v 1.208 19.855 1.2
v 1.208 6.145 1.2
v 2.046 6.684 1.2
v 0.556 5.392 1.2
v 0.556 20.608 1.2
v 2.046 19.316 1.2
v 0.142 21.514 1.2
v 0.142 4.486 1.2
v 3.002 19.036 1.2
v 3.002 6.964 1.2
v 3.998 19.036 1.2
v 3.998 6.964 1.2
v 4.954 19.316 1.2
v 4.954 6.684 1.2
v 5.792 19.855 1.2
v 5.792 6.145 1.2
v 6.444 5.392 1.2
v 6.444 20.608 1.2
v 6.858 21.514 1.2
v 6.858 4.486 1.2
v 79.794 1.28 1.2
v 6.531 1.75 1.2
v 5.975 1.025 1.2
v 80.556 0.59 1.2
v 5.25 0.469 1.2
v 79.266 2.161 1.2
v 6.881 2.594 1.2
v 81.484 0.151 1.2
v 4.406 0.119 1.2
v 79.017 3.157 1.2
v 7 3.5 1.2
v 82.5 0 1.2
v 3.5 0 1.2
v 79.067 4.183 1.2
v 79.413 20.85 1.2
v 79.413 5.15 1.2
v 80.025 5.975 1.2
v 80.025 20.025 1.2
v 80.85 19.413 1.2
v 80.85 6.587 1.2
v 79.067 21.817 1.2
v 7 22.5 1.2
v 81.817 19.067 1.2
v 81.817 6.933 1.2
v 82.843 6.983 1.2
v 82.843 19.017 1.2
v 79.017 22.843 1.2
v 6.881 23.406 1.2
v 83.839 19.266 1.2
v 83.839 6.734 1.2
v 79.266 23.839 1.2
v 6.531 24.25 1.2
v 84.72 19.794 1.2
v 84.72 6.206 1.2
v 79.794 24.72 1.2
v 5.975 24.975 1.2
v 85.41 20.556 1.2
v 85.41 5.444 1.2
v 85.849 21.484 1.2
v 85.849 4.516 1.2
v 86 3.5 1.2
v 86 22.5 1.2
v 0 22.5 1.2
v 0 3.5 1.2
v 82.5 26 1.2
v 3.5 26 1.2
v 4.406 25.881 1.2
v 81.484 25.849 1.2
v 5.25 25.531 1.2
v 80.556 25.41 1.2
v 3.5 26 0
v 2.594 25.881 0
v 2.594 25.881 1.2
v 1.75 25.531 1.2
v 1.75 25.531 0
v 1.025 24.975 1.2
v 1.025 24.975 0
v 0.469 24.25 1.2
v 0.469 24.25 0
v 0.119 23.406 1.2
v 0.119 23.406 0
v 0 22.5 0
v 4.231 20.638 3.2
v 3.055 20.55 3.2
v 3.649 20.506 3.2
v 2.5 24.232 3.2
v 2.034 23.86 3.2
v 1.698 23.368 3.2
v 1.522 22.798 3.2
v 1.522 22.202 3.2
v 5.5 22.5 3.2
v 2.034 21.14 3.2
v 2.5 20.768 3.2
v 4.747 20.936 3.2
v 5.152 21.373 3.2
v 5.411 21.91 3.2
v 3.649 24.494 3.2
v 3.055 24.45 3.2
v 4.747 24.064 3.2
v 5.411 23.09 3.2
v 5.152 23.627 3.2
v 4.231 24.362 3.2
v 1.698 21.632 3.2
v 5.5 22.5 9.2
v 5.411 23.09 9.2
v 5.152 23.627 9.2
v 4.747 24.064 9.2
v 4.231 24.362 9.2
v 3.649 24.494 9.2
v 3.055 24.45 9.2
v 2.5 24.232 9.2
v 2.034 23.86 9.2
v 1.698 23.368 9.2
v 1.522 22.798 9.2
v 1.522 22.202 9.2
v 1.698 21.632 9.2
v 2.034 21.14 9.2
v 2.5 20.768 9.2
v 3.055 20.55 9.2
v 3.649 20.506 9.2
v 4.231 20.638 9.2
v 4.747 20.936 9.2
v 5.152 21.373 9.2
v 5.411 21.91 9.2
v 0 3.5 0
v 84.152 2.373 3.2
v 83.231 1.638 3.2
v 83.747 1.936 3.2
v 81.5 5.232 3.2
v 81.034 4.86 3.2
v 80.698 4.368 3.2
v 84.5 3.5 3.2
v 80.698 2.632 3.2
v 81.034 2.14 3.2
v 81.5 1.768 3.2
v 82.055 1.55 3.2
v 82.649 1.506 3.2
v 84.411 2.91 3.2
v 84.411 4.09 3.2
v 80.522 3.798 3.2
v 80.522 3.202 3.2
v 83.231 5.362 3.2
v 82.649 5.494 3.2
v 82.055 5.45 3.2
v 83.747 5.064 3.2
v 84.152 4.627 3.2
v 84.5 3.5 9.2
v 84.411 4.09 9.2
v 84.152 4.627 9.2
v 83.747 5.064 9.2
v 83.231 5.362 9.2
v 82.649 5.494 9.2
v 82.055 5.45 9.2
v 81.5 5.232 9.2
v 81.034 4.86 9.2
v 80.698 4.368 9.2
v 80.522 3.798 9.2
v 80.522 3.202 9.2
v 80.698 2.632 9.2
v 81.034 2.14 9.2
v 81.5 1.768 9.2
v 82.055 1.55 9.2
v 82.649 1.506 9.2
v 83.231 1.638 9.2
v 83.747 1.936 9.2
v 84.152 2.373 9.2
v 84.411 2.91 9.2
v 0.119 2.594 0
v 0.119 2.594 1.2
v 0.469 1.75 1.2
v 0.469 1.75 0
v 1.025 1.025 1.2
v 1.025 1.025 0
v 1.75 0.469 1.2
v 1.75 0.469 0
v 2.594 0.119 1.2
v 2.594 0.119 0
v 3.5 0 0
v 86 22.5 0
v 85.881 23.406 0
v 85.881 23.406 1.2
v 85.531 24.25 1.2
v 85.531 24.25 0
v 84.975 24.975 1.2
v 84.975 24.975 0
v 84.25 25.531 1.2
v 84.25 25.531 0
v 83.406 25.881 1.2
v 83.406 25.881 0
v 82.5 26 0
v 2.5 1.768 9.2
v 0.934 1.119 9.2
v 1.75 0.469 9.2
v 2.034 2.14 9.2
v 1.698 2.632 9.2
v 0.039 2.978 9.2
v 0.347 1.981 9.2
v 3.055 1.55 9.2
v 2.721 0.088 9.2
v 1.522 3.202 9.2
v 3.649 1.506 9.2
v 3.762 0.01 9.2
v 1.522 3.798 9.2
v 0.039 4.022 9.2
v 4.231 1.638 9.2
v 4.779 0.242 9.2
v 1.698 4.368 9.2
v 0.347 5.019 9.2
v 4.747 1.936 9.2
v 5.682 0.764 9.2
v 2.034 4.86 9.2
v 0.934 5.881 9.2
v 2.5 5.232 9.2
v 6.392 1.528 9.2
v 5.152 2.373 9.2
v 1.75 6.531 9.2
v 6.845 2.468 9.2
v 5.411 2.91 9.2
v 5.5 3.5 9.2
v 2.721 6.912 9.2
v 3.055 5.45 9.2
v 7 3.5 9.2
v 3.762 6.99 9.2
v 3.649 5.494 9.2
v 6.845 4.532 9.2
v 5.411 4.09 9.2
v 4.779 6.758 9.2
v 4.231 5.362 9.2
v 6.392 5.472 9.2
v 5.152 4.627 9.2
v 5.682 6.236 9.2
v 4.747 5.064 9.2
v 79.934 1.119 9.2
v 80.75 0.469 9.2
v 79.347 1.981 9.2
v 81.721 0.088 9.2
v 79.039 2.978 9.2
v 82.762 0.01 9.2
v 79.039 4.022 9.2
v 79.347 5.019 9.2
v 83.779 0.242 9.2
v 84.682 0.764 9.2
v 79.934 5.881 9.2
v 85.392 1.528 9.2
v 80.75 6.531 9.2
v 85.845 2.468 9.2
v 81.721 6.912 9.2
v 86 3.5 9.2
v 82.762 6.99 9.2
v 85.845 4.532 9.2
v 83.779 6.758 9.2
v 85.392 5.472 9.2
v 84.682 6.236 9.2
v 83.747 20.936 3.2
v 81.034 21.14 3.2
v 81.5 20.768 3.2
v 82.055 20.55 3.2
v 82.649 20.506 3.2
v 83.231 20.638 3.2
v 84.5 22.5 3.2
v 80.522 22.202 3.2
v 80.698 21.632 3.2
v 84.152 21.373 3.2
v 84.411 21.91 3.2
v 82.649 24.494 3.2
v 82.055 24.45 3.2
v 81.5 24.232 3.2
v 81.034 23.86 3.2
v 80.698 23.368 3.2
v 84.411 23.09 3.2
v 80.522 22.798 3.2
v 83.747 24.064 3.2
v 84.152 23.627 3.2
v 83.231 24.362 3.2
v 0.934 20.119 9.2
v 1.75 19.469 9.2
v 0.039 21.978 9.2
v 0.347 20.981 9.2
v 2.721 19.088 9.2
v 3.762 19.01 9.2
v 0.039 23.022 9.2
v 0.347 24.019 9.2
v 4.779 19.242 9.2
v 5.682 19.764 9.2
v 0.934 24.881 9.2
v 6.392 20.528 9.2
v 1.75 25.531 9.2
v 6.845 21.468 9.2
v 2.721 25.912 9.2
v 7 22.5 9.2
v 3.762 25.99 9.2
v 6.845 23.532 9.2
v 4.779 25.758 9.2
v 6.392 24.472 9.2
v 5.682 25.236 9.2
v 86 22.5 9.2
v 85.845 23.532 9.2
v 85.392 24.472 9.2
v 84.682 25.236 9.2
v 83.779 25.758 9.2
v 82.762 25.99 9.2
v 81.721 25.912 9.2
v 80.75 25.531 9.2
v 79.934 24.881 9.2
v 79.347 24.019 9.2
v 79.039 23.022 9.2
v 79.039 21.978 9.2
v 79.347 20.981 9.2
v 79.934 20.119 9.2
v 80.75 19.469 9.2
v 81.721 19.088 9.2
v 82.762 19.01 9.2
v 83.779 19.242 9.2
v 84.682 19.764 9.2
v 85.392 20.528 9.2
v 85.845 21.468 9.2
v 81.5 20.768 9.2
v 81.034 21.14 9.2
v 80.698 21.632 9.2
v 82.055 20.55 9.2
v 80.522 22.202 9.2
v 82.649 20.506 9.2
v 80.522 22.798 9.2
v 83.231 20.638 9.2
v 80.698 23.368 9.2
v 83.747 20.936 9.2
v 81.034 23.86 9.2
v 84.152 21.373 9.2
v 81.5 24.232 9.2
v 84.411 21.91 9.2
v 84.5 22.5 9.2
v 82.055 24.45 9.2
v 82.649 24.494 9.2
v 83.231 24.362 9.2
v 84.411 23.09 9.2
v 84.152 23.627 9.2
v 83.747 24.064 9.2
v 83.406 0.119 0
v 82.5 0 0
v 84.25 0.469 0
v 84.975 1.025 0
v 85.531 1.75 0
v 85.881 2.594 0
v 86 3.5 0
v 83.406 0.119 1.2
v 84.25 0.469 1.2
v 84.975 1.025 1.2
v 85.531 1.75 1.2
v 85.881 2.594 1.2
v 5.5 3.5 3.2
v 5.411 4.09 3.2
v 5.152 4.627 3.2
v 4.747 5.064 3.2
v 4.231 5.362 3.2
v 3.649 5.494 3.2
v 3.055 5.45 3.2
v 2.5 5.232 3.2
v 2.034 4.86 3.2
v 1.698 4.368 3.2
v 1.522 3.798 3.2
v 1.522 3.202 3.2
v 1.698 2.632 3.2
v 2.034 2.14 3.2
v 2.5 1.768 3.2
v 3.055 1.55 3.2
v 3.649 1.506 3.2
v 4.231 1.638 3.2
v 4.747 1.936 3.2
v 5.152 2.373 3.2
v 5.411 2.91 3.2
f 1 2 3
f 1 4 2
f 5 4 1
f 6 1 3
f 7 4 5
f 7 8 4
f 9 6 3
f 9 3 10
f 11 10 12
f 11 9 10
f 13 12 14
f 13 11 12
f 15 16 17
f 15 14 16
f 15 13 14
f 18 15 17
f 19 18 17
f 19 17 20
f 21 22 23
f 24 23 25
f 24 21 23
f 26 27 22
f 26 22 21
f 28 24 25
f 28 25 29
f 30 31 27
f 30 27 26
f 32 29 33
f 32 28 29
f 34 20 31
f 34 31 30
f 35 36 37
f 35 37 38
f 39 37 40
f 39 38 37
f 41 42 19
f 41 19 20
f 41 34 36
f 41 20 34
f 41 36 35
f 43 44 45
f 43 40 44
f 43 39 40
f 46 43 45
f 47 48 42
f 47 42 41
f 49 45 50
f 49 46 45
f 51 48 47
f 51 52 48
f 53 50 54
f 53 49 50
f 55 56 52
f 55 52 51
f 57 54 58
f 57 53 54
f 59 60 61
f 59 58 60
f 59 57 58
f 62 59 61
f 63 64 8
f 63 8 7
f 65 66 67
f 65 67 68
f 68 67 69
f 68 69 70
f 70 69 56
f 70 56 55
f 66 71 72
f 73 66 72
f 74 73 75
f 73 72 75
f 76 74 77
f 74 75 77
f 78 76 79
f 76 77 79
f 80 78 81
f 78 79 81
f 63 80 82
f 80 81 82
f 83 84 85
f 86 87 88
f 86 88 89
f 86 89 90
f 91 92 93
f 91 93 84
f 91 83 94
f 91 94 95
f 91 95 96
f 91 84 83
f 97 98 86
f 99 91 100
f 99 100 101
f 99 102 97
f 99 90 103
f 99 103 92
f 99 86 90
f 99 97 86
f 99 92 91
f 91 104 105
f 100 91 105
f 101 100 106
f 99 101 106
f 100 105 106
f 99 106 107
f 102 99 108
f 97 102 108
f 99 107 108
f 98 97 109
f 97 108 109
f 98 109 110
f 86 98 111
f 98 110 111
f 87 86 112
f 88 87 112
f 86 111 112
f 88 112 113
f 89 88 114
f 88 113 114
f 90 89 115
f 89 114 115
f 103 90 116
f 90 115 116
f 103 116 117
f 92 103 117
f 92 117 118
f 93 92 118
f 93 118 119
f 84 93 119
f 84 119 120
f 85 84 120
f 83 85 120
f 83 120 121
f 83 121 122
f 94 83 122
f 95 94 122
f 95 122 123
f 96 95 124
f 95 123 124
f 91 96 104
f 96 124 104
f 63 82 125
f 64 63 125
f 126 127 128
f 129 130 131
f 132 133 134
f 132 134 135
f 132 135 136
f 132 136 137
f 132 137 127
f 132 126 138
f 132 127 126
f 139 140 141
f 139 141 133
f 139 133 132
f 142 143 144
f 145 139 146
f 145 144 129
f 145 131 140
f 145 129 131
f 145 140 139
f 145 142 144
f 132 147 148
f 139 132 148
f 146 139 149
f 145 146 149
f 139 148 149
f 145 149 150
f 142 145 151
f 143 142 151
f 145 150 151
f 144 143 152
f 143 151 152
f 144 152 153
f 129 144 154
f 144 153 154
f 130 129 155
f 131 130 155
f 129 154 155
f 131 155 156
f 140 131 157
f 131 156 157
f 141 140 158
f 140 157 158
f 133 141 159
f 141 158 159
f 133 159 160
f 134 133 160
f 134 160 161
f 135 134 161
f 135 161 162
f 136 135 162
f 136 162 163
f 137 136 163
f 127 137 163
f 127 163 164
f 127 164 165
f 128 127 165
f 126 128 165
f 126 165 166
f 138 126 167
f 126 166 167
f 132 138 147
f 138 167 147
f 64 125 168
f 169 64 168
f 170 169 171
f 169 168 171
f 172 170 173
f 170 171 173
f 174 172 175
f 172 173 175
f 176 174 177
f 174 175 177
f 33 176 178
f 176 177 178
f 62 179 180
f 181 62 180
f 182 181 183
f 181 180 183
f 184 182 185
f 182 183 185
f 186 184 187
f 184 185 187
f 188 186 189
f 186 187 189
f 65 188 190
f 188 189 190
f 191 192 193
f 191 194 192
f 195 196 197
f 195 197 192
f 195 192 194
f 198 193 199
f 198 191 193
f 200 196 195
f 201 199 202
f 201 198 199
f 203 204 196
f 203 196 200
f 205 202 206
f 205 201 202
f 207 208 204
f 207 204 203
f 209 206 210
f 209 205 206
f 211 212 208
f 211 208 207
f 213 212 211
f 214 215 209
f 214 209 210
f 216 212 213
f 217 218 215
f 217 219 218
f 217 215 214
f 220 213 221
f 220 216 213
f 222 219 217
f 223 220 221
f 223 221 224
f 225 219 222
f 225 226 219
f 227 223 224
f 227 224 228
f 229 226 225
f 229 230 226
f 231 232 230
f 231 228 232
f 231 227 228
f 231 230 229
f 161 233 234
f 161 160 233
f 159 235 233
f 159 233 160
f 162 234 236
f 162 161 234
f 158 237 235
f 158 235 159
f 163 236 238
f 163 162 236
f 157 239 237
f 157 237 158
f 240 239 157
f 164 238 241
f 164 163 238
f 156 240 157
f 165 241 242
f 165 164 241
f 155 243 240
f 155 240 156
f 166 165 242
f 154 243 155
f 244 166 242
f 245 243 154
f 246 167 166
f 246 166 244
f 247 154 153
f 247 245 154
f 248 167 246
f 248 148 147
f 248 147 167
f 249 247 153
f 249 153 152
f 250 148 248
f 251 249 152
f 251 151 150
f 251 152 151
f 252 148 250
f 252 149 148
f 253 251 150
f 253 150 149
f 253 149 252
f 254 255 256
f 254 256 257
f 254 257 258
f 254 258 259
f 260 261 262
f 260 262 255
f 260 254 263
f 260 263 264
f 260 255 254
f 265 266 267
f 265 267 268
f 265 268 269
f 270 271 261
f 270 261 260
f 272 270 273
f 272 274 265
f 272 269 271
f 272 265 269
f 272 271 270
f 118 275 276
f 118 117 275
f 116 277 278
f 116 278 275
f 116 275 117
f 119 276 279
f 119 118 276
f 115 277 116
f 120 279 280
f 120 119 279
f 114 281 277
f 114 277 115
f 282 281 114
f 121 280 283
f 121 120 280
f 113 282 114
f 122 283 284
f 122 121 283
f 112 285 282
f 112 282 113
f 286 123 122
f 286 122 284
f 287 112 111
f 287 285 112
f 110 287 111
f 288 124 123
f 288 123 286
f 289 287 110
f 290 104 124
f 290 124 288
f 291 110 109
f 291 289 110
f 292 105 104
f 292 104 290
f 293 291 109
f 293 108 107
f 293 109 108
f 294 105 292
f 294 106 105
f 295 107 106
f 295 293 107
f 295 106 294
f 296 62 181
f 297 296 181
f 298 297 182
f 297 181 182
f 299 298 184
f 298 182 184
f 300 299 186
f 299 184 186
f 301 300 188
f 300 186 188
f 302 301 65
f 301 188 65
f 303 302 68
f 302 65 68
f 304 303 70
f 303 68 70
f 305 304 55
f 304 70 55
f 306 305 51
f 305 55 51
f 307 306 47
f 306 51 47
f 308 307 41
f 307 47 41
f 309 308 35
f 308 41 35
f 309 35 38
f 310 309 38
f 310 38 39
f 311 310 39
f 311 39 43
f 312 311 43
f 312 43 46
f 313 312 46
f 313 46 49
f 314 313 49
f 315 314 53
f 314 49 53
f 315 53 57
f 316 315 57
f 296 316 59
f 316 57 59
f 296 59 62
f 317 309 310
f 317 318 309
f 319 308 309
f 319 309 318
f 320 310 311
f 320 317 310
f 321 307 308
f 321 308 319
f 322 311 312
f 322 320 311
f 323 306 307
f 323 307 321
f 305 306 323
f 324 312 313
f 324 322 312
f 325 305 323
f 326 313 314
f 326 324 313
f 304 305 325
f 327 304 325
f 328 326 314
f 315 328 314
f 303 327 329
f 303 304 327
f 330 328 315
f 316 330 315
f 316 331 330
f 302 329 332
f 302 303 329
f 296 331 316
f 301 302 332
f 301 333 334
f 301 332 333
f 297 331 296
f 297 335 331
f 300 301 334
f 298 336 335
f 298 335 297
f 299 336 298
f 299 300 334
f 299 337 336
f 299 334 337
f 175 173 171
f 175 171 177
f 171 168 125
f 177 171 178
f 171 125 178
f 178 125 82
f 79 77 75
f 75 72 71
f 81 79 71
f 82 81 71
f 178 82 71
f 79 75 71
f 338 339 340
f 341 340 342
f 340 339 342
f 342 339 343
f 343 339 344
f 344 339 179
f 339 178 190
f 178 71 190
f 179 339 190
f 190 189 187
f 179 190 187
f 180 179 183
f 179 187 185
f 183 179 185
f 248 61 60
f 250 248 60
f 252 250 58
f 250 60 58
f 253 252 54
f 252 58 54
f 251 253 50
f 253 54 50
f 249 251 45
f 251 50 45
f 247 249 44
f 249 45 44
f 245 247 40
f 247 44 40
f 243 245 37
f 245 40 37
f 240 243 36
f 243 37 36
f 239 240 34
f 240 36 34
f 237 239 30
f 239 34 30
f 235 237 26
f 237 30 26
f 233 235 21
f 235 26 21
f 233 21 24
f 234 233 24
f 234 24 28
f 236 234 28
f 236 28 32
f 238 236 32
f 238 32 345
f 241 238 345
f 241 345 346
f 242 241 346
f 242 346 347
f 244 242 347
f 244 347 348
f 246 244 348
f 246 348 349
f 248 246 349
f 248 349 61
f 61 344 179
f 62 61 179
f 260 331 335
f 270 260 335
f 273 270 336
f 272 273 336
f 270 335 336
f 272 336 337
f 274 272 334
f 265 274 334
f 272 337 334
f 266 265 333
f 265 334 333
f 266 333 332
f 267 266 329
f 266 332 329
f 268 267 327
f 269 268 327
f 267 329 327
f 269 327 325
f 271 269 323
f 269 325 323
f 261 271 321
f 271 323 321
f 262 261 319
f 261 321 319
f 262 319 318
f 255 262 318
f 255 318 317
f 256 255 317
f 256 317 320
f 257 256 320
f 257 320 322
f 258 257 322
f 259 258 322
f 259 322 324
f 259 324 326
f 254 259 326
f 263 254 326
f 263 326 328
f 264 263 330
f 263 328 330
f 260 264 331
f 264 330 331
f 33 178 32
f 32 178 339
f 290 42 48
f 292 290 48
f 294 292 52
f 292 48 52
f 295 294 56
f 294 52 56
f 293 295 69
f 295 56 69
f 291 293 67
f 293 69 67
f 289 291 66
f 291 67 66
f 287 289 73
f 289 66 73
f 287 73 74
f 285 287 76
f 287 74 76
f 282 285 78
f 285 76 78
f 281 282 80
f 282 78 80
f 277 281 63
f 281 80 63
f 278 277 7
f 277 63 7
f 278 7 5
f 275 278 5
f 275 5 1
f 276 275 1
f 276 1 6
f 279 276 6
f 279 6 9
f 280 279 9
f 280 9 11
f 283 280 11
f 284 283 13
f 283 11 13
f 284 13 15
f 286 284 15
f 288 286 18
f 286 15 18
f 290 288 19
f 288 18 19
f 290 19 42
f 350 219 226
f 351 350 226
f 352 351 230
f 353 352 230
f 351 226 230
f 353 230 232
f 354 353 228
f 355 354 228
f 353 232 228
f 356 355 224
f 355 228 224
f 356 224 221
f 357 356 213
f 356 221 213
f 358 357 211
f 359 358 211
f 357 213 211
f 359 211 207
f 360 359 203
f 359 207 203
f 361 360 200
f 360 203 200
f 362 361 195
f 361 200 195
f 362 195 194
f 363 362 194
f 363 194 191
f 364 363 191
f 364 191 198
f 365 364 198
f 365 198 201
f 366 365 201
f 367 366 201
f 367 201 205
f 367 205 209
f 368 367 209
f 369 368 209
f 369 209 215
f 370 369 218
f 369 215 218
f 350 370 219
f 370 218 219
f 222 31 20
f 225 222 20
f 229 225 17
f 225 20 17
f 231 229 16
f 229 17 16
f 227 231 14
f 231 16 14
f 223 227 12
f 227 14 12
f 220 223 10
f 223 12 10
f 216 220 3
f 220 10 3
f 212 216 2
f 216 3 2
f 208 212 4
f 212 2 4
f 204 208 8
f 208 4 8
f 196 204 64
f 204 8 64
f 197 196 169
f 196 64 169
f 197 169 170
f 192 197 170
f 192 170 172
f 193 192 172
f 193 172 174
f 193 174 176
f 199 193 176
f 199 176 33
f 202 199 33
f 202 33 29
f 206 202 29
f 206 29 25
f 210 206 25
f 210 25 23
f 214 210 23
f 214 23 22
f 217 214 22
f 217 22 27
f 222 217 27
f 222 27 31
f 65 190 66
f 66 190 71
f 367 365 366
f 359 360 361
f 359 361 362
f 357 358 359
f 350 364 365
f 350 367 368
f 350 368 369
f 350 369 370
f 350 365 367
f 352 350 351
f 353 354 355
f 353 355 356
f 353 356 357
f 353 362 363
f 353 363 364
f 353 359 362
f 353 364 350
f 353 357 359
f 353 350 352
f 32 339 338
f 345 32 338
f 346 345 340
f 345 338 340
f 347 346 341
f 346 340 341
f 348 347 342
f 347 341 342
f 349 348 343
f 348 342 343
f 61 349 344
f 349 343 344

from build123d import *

# Parameters (mm, degrees)
EXTRUDE_1_DEPTH     = 1.2
EXTRUDE_START       = 1.2
SKETCH_1_3_R        = 3.5
EXTRUDE_2_DEPTH     = 8
SKETCH_2_R          = 2
CUT_EXTRUDE_1_DEPTH = 6


with BuildPart() as part:
    # Эскиз1 → Бобышка-Вытянуть1 (new body)
    with BuildSketch(Plane.XY):
        with BuildLine():
            Line((0, 22.5), (0, 3.5))
            ThreePointArc((0, 3.5), (1.025126266, 1.025126266), (3.5, 0))
            Line((3.5, 0), (82.5, 0))
            ThreePointArc((82.5, 0), (84.974873734, 1.025126266), (86, 3.5))
            Line((86, 3.5), (86, 22.5))
            ThreePointArc((86, 22.5), (84.974873734, 24.974873734), (82.5, 26))
            Line((82.5, 26), (3.5, 26))
            ThreePointArc((3.5, 26), (1.025126266, 24.974873734), (0, 22.5))
        make_face()
    extrude(amount=EXTRUDE_1_DEPTH)

    # Эскиз1<3> → Бобышка-Вытянуть2 (add)
    with BuildSketch(Plane.XY.offset(EXTRUDE_START)):
        with Locations((82.5, 22.5)):
            Circle(SKETCH_1_3_R)
        with Locations((82.5, 3.5)):
            Circle(SKETCH_1_3_R)
        with Locations((3.5, 22.5)):
            Circle(SKETCH_1_3_R)
        with Locations((3.5, 3.5)):
            Circle(SKETCH_1_3_R)
    extrude(amount=EXTRUDE_2_DEPTH)

    # Эскиз2 → Вырез-Вытянуть1 (cut)
    with BuildSketch(Plane.XY.offset(9.2)):
        with Locations((3.5, 22.5)):
            Circle(SKETCH_2_R)
        with Locations((3.5, 3.5)):
            Circle(SKETCH_2_R)
        with Locations((82.5, 22.5)):
            Circle(SKETCH_2_R)
        with Locations((82.5, 3.5)):
            Circle(SKETCH_2_R)
    extrude(amount=-CUT_EXTRUDE_1_DEPTH, mode=Mode.SUBTRACT)


solid = part.part
